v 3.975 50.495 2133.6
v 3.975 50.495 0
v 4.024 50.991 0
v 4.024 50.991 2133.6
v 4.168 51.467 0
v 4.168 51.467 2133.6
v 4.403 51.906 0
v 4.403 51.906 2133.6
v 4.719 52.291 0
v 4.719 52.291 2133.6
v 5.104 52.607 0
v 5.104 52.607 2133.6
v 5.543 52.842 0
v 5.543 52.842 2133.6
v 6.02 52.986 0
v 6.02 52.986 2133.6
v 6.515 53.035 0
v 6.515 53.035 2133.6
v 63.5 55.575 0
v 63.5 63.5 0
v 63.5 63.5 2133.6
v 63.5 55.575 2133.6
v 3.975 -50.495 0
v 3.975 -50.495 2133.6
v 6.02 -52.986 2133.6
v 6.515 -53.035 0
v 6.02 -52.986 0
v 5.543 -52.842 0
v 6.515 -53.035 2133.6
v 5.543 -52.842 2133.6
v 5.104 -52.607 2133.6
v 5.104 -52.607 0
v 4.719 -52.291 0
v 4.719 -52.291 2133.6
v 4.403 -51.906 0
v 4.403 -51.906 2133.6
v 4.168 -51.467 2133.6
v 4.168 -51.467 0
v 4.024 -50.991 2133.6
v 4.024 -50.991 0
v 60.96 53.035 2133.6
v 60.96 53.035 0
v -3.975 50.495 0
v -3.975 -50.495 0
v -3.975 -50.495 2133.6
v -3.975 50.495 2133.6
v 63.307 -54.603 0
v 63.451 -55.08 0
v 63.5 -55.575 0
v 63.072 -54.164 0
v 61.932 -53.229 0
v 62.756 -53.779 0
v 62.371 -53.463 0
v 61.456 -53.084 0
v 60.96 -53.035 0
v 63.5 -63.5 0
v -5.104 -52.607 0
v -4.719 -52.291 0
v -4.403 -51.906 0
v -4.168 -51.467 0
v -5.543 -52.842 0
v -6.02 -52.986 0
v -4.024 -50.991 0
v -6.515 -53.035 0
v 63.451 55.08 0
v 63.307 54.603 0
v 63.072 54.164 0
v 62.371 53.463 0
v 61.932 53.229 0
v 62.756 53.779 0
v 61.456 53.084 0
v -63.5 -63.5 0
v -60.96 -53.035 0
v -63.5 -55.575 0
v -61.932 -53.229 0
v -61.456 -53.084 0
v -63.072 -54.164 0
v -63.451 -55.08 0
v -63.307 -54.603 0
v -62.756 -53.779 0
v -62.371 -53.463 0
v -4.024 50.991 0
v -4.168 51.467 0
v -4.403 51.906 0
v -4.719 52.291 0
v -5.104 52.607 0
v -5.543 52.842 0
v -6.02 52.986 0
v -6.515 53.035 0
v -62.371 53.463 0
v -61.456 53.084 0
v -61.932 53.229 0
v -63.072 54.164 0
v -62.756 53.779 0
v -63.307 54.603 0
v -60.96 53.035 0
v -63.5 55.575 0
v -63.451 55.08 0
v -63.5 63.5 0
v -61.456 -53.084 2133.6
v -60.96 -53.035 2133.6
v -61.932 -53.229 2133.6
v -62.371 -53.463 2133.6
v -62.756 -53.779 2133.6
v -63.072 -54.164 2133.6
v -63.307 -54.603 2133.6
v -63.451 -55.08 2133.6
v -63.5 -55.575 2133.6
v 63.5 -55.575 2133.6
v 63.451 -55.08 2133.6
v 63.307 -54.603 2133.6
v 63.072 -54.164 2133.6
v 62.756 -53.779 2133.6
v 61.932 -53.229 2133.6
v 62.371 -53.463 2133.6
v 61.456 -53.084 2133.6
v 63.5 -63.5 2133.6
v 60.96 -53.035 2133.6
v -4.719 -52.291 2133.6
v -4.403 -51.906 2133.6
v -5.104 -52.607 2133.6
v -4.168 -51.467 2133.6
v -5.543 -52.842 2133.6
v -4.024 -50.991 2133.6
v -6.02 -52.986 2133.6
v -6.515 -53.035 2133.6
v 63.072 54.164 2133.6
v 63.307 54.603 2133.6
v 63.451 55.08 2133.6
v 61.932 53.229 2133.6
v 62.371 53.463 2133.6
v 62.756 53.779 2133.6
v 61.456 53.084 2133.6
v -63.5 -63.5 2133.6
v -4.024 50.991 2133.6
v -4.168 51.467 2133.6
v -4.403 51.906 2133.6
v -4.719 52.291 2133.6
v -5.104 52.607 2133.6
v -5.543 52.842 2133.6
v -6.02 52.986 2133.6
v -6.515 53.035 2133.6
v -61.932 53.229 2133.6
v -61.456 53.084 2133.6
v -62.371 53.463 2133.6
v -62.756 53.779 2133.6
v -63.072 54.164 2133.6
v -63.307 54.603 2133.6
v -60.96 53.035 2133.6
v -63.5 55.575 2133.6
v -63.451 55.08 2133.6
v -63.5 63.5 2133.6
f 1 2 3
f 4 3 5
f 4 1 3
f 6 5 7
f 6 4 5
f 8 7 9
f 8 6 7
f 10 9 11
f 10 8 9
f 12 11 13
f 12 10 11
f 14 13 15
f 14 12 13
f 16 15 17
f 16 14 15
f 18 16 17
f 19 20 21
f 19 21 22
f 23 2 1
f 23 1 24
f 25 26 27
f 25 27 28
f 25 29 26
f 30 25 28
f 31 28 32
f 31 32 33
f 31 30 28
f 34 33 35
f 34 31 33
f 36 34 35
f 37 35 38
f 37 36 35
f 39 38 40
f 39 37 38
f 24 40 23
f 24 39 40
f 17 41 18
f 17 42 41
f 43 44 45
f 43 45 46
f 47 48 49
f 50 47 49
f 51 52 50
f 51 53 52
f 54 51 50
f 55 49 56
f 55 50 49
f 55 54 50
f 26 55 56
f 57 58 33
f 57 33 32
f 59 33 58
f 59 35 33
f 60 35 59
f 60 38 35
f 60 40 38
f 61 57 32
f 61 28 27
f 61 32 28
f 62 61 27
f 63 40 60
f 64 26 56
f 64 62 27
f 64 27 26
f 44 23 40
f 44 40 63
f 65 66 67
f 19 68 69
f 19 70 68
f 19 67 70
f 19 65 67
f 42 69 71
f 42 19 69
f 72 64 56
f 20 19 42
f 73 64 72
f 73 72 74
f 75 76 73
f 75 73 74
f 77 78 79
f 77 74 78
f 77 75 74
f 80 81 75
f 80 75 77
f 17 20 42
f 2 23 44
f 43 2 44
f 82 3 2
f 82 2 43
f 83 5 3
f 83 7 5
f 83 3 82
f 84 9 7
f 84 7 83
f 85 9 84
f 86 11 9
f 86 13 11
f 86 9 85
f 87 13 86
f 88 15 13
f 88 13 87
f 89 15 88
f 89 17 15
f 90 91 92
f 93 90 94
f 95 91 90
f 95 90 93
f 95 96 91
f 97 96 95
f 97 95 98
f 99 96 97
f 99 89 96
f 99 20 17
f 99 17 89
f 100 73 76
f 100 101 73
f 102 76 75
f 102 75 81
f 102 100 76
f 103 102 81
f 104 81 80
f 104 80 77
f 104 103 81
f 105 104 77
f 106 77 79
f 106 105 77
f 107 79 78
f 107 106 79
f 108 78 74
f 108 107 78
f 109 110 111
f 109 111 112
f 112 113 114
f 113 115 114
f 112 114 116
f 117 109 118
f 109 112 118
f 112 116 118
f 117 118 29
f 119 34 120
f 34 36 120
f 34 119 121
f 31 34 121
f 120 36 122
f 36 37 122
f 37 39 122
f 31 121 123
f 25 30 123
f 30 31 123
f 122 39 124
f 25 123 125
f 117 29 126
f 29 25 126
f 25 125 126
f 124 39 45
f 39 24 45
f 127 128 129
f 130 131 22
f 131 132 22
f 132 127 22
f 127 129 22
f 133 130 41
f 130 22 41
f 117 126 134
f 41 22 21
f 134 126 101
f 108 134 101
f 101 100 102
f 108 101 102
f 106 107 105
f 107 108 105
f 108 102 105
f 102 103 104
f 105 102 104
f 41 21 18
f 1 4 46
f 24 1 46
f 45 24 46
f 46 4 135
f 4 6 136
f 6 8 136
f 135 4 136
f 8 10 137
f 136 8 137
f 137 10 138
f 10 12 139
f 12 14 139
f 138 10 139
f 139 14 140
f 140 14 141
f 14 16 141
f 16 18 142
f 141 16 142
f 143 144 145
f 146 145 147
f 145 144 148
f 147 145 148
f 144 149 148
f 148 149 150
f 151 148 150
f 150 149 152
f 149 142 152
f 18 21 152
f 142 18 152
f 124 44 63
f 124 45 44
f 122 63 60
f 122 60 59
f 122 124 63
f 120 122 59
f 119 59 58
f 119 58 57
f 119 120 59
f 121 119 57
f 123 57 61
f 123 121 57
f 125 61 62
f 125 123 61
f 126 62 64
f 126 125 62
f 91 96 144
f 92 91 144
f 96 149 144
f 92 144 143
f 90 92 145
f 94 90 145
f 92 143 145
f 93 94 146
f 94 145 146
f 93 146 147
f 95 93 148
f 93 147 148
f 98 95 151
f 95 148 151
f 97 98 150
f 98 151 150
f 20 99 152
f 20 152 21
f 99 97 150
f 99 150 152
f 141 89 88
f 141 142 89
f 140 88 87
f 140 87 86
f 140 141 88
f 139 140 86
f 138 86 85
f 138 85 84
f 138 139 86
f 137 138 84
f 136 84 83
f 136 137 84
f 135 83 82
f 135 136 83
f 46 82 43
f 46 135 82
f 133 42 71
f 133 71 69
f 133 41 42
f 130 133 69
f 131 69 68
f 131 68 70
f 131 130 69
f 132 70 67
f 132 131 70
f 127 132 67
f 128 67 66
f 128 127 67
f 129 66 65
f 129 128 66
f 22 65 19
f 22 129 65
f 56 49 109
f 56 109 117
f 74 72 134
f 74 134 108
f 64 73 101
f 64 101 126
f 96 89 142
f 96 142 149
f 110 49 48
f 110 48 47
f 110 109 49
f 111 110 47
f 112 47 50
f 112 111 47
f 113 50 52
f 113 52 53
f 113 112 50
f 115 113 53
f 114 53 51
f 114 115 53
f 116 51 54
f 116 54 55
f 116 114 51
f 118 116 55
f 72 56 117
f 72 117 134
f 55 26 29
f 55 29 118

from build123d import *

# Parameters (mm, degrees)
BOSS_EXTRUDE1_DEPTH = 2133.6
SKETCH2_W           = 19.05
SKETCH2_H           = 19.05
CUT_EXTRUDE1_DEPTH  = 2136.489044692
FILLET1_R           = 2.54


with BuildPart() as part:
    # Sketch1 → Boss-Extrude1 (new body)
    with BuildSketch(Plane.XY):
        Polygon((-63.5, 63.5), (63.5, 63.5), (63.5, 53.0352), (23.0251, 53.0352), (23.0251, 33.9852), (3.9751, 33.9852), (3.9751, -53.0352), (63.5, -53.0352), (63.5, -63.5), (-63.5, -63.5), (-63.5, -53.0352), (-3.9751, -53.0352), (-3.9751, 33.9852), (-23.0251, 33.9852), (-23.0251, 53.0352), (-63.5, 53.0352), align=None)
    extrude(amount=BOSS_EXTRUDE1_DEPTH)

    # Sketch2 → Cut-Extrude1 (cut, through all)
    with BuildSketch(Plane.XY):
        with Locations((-13.5001, 43.5102)):
            Rectangle(SKETCH2_W, SKETCH2_H)
        with Locations((13.5001, 43.5102)):
            Rectangle(SKETCH2_W, SKETCH2_H)
    extrude(amount=CUT_EXTRUDE1_DEPTH, mode=Mode.SUBTRACT)

    # Fillet1
    fillet1_edges = [part.edges().sort_by_distance(p)[0] for p in [
        (-63.5, -53.0352, 1066.8),
        (-3.9751, -53.0352, 1066.8),
        (-63.5, 53.0352, 1066.8),
        (63.5, 53.0352, 1066.8),
        (3.9751, -53.0352, 1066.8),
        (63.5, -53.0352, 1066.8),
        (-3.9751, 53.0352, 1066.8),
        (3.9751, 53.0352, 1066.8),
    ]]
    fillet(fillet1_edges, radius=FILLET1_R)


solid = part.part
